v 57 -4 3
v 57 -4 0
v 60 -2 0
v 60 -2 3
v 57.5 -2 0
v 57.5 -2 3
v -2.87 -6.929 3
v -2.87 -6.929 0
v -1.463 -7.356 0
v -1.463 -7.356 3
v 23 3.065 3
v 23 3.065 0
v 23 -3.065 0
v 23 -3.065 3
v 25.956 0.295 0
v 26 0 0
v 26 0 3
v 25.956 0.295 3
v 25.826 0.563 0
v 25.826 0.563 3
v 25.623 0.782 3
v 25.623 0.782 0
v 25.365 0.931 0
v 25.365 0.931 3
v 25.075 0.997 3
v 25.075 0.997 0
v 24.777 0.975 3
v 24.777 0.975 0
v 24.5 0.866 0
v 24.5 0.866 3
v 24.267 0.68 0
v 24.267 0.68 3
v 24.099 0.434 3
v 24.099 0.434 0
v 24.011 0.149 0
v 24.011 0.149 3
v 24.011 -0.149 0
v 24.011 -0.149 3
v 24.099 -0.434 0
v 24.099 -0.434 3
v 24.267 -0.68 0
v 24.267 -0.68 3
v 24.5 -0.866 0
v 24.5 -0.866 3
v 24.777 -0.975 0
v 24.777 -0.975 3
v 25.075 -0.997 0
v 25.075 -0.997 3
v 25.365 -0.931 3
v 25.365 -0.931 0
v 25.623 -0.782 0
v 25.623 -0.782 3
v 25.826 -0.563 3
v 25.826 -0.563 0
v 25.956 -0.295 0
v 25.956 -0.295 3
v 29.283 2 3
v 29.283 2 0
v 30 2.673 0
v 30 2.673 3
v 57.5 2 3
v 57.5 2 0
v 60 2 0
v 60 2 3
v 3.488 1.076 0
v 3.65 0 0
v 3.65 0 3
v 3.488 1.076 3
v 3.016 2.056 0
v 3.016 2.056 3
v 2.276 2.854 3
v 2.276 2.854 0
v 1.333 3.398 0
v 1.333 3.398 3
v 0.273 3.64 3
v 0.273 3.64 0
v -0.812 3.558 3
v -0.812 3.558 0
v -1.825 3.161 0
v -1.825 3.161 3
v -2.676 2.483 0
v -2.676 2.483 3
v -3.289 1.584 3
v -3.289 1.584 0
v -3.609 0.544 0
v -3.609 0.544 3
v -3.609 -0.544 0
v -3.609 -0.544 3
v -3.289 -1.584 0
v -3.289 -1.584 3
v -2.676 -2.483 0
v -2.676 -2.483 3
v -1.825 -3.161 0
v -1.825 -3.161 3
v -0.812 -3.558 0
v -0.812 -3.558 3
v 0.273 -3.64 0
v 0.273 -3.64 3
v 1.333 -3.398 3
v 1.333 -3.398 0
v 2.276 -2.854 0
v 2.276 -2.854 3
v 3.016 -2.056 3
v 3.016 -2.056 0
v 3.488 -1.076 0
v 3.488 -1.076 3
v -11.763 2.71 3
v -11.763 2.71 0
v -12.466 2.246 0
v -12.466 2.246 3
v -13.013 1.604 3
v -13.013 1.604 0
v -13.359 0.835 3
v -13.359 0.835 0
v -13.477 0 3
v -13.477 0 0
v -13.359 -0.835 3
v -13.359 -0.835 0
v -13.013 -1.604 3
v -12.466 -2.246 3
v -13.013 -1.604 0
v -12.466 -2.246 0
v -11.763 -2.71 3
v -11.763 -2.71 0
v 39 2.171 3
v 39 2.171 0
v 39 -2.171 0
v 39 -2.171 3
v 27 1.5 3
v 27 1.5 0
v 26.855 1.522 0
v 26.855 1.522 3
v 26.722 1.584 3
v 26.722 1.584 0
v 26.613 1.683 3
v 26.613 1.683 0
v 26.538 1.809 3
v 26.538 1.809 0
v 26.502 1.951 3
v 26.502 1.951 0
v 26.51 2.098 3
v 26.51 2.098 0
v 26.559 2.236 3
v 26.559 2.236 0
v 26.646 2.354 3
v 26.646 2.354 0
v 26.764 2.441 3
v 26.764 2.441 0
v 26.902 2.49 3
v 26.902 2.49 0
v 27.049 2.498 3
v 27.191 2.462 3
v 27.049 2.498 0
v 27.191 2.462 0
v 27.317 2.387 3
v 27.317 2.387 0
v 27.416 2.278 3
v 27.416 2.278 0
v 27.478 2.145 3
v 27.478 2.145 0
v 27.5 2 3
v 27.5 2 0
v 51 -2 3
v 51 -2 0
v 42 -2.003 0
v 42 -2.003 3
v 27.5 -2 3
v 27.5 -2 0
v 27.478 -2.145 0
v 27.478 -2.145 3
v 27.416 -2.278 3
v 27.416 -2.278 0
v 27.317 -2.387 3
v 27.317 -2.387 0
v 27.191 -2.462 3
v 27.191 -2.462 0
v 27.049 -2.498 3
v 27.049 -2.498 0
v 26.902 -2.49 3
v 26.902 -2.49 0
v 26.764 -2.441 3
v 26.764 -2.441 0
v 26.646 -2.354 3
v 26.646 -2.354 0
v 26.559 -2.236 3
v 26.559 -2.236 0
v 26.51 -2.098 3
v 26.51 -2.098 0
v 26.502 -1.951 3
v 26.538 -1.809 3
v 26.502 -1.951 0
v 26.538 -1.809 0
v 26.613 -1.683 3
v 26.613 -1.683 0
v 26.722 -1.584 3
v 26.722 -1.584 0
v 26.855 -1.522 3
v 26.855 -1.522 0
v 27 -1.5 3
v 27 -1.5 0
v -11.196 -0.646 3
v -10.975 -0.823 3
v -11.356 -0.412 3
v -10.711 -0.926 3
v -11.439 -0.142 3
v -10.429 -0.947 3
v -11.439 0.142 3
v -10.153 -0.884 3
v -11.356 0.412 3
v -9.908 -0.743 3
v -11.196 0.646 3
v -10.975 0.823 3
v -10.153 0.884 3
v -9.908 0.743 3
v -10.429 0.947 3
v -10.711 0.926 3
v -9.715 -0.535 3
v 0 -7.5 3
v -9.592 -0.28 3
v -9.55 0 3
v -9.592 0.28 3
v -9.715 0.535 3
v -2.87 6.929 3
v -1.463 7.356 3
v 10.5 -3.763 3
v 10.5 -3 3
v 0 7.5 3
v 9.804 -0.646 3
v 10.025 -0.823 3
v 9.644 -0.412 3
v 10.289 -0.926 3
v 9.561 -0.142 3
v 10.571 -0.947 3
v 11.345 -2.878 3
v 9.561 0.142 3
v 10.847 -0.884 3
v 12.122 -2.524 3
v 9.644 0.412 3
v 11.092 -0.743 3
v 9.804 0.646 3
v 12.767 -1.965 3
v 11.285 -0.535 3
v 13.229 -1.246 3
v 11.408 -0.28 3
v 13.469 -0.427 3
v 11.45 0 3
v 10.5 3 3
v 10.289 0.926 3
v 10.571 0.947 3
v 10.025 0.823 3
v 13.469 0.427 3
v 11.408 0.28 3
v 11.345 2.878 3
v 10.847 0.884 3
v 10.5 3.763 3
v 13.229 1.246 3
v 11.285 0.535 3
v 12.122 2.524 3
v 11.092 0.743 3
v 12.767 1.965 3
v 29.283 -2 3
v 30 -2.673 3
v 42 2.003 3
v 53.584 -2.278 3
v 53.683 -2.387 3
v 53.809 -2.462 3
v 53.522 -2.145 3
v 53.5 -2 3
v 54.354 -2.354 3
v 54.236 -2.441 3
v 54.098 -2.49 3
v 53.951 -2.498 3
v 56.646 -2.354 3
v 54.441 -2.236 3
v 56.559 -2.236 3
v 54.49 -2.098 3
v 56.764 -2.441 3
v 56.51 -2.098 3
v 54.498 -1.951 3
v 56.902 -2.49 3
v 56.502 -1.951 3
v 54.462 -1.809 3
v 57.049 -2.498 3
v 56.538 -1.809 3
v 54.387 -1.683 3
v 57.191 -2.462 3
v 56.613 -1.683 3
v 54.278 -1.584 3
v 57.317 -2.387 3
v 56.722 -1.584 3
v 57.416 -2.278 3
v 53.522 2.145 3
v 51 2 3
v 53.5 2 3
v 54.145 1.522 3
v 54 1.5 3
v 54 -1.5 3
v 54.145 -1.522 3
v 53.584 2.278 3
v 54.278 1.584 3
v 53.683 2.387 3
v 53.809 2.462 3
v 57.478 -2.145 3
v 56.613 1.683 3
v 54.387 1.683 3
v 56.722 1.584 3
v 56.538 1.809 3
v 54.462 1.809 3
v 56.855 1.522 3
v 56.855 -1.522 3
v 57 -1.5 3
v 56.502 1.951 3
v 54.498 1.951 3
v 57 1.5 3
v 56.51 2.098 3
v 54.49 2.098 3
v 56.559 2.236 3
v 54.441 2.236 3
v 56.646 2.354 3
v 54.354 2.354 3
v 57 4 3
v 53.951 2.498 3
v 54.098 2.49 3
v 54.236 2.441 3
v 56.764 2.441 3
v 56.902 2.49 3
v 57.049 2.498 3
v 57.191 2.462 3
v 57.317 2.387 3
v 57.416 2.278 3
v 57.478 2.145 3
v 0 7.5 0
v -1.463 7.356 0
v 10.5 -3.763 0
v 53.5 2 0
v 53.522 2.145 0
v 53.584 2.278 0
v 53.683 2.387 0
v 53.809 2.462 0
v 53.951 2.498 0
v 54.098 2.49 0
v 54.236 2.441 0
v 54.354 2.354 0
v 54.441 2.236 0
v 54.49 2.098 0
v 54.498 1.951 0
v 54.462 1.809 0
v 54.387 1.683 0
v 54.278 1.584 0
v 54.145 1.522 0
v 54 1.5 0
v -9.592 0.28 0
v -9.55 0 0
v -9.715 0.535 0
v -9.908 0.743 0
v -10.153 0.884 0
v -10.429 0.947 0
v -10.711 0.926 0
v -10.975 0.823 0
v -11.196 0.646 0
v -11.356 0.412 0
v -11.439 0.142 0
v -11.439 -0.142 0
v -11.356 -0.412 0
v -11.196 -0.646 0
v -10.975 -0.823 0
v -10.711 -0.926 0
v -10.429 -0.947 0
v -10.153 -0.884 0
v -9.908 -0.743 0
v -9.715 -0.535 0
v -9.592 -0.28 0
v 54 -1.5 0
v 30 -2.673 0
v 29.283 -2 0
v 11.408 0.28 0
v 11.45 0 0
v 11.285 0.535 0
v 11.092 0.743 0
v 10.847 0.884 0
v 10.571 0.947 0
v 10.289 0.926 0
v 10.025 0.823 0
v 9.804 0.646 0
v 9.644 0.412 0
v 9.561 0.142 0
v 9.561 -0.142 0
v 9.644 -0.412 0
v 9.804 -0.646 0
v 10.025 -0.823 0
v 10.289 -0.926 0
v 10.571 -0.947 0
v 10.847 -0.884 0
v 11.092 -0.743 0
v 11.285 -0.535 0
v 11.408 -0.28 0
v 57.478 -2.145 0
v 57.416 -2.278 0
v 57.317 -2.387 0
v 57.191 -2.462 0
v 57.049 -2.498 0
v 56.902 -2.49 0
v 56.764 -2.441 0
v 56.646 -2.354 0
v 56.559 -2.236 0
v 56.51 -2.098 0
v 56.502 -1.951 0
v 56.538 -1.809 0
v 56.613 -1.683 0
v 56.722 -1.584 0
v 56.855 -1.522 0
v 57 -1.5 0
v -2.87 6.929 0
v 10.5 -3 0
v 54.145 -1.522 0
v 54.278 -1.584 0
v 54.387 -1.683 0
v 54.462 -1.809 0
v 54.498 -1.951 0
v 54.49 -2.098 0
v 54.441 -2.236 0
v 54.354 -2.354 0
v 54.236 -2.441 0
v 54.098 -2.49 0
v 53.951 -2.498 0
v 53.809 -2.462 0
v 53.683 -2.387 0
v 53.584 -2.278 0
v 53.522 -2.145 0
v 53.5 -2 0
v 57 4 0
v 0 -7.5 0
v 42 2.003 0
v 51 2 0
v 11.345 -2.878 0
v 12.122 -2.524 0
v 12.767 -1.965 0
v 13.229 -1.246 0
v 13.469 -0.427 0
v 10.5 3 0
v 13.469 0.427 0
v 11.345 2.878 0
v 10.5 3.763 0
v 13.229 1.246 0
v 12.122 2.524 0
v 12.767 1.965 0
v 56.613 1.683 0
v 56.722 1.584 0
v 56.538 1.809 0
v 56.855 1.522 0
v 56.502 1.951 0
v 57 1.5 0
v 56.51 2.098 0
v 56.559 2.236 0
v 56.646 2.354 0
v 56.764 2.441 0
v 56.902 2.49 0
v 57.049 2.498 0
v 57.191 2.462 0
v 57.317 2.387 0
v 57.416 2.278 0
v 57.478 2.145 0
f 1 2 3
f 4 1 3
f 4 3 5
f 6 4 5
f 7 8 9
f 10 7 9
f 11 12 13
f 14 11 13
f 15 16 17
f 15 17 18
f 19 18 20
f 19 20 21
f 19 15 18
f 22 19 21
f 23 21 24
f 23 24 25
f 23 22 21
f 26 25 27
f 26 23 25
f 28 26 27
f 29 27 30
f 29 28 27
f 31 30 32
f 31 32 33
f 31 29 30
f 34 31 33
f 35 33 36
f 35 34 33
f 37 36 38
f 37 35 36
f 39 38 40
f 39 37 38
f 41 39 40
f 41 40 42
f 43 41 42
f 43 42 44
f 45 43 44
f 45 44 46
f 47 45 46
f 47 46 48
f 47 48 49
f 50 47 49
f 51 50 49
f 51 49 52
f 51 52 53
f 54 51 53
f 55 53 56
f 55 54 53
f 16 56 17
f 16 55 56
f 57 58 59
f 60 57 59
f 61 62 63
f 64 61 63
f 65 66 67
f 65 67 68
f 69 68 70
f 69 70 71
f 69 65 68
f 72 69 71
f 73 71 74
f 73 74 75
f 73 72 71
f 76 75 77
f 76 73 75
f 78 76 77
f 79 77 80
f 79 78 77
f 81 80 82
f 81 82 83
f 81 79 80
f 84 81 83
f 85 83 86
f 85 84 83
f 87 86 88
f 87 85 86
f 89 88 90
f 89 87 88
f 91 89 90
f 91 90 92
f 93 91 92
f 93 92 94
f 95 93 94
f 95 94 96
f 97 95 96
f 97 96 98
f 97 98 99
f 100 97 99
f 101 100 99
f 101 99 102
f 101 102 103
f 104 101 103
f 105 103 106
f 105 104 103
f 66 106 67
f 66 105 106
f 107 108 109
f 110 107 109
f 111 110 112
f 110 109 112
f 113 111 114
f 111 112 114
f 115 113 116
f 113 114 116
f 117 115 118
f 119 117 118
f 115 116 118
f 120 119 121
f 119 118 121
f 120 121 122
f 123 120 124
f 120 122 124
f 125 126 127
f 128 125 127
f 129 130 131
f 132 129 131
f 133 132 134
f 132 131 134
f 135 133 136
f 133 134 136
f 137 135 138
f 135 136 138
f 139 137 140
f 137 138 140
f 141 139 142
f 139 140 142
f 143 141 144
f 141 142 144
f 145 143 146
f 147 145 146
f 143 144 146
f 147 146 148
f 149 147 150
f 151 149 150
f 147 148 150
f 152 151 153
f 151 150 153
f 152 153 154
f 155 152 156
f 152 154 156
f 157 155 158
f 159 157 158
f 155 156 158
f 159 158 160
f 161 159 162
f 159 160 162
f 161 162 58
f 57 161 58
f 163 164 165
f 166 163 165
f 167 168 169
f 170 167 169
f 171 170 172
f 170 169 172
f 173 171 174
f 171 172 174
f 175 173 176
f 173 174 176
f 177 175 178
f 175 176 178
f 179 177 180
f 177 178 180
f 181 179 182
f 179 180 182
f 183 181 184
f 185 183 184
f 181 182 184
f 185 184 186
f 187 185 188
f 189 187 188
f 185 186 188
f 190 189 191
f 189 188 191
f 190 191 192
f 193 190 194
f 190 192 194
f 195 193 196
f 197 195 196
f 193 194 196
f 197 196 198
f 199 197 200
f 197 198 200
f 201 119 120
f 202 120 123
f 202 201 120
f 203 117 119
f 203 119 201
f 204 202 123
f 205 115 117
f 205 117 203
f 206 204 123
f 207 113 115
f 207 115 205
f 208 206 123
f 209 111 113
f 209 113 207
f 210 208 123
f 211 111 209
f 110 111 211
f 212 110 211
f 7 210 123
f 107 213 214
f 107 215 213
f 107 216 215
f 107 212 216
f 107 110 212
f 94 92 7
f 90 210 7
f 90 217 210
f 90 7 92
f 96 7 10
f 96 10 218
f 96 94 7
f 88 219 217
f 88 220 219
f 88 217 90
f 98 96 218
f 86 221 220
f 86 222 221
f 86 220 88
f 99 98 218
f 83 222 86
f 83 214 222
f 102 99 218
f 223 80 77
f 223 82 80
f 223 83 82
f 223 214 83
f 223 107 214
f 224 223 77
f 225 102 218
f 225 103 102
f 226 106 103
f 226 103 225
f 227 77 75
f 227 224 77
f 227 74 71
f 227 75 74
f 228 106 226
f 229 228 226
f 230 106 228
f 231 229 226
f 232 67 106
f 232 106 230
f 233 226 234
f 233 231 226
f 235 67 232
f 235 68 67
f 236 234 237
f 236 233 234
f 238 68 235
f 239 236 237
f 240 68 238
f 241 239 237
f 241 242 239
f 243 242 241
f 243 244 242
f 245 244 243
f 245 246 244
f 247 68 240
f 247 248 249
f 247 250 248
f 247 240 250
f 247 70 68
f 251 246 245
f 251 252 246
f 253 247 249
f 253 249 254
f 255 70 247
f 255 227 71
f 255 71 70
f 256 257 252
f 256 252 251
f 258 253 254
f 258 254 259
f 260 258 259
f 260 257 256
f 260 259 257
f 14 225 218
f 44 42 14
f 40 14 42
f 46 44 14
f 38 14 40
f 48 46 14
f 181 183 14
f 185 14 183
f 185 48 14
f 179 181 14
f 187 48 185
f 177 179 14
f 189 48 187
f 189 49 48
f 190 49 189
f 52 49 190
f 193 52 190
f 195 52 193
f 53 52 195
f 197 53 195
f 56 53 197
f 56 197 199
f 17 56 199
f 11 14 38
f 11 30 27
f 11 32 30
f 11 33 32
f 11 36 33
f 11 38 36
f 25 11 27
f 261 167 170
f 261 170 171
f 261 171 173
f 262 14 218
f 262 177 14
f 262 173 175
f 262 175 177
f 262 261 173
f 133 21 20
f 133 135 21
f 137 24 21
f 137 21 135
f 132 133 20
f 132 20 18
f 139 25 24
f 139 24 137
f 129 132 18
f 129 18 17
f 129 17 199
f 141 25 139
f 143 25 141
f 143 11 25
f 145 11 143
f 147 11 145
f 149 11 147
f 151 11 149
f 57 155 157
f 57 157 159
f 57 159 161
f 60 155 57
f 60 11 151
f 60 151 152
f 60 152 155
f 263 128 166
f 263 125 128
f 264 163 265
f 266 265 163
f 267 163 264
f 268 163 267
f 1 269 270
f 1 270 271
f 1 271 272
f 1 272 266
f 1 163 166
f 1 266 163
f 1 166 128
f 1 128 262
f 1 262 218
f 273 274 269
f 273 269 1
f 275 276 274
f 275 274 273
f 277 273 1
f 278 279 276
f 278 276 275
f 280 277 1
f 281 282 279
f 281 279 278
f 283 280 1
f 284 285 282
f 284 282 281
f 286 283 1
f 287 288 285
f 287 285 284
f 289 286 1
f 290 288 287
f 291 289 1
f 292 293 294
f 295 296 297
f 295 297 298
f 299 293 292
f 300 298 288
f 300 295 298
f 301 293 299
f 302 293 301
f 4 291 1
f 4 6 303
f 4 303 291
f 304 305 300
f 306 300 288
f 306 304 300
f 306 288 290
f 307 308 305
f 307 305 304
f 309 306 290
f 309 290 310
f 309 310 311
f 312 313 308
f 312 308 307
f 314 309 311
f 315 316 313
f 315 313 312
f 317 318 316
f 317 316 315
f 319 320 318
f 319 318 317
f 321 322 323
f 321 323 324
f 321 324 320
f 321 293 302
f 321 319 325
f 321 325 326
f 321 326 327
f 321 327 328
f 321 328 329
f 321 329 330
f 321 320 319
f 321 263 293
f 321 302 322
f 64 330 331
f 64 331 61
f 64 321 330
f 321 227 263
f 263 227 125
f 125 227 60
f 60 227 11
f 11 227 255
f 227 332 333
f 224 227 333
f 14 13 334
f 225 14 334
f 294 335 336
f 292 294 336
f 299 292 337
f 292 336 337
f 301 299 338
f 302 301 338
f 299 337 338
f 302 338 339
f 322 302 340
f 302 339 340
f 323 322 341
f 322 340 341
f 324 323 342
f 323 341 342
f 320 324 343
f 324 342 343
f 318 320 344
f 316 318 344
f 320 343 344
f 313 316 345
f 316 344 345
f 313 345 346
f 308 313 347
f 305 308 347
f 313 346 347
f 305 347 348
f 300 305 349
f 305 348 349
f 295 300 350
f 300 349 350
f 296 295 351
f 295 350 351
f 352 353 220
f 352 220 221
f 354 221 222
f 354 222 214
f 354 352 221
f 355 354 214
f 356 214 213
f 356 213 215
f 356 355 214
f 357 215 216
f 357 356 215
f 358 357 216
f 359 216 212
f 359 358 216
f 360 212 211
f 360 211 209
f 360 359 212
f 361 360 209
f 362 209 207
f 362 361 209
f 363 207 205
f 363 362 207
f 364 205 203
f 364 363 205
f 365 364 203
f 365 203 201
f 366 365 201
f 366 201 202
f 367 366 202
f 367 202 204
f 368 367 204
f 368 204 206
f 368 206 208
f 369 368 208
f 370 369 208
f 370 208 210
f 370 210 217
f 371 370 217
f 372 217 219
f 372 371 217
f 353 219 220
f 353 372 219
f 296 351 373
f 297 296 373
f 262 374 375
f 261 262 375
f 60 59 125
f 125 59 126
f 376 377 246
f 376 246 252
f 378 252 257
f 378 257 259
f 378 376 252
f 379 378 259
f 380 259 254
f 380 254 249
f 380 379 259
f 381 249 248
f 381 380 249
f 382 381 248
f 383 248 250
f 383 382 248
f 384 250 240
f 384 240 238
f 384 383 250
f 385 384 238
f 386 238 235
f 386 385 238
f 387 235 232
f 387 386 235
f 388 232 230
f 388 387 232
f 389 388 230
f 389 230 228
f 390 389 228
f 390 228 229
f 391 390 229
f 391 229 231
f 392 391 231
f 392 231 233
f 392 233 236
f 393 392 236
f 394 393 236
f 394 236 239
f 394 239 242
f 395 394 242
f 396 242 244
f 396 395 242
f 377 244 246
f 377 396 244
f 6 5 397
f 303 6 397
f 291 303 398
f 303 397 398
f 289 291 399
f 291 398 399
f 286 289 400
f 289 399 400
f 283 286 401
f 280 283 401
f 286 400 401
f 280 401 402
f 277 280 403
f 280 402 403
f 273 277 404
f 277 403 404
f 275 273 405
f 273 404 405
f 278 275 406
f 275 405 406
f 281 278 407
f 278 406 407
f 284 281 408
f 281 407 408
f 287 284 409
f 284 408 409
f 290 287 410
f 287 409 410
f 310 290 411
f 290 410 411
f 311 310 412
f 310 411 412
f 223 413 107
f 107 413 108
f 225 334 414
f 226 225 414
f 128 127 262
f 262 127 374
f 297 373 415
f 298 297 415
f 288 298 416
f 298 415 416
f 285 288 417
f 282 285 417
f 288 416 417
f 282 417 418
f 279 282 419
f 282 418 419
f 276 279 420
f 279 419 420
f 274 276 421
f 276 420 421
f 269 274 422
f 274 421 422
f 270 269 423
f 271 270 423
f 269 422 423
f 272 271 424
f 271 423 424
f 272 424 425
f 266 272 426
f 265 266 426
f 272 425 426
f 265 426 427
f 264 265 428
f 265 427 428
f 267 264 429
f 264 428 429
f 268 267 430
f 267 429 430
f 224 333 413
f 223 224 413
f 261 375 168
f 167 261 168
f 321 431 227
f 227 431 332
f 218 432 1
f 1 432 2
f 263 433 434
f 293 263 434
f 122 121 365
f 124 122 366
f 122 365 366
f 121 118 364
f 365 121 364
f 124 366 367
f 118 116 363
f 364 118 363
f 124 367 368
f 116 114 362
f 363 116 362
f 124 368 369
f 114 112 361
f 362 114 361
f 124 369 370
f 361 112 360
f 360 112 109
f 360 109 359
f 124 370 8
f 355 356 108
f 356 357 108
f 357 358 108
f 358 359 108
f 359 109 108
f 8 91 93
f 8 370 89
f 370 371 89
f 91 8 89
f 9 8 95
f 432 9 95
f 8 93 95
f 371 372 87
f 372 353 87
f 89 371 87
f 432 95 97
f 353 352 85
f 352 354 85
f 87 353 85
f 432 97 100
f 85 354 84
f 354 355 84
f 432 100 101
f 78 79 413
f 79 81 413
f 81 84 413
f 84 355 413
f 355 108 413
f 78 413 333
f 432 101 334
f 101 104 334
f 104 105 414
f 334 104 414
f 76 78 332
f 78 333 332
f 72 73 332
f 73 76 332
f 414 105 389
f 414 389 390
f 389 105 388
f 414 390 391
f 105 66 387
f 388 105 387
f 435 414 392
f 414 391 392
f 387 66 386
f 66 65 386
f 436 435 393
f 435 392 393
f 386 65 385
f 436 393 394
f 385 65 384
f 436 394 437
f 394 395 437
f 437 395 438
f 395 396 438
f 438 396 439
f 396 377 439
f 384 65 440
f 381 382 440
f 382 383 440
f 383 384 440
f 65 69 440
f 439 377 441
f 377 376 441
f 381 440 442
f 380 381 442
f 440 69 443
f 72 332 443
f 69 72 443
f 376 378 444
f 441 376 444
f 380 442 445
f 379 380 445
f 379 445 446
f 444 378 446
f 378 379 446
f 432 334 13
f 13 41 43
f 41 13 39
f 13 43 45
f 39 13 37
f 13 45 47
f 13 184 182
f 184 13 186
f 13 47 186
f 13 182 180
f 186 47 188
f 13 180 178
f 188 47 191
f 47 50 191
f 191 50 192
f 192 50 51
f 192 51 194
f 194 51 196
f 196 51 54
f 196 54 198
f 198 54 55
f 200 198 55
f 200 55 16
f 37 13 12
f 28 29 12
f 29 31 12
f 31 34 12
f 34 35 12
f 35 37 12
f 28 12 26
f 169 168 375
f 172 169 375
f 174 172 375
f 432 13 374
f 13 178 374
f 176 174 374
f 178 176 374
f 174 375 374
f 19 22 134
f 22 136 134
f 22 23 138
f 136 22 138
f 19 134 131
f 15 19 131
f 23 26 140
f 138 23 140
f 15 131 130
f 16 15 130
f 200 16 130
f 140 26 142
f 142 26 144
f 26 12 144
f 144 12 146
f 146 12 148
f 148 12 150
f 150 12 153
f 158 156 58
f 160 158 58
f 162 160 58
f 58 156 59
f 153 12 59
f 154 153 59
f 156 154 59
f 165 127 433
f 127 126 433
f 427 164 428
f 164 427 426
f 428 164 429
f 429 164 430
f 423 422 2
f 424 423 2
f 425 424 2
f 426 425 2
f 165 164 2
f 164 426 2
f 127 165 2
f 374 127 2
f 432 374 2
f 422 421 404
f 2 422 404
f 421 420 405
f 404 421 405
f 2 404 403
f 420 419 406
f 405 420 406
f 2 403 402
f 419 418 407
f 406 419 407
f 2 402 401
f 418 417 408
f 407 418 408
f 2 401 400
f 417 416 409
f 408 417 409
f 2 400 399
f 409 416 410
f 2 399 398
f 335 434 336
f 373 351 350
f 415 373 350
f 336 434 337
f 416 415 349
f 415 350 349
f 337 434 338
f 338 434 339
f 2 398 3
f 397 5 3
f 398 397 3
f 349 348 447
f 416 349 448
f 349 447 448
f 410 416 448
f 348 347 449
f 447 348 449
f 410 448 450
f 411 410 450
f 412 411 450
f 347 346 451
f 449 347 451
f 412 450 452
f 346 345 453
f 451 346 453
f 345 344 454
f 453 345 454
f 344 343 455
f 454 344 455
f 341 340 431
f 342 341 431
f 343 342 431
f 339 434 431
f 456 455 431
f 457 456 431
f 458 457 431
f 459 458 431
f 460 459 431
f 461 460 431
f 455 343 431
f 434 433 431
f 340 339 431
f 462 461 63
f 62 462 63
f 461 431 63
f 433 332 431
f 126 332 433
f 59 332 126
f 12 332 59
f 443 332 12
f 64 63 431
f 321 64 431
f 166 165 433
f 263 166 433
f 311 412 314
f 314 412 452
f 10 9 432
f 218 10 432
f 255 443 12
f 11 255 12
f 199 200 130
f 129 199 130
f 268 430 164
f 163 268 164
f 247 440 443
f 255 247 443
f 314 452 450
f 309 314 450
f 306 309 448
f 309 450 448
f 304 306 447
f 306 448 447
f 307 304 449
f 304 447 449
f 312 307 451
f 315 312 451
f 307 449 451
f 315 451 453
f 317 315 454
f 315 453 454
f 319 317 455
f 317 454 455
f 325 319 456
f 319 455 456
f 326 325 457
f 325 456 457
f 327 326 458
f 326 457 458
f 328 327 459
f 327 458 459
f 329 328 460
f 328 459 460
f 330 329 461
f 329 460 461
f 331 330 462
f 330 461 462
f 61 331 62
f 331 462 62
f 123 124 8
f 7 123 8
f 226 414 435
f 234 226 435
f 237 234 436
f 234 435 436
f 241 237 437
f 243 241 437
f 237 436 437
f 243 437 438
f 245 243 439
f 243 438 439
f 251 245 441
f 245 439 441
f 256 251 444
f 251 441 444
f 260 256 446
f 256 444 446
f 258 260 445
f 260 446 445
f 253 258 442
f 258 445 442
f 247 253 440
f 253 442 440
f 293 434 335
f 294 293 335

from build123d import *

# Parameters (mm, degrees)
SKETCH_2_R      = 0.999999817
SKETCH_2_R_2    = 0.950000242
SKETCH_2_R_3    = 3.65
EXTRUDE_2_DEPTH = 3


with BuildPart() as part:
    # 草图2 → 凸台-拉伸2 (new body)
    with BuildSketch(Plane.XY):
        with BuildLine():
            Line((57.00000003, 4.00000019), (0, 7.499999832))
            Line((0, 7.499999832), (-1.463177381, 7.355889771))
            Line((-1.463177381, 7.355889771), (-2.870125696, 6.9290963))
            Line((-2.870125696, 6.9290963), (-11.76304094, 2.710484566))
            ThreePointArc((-11.76304094, 2.710484566), (-13.477244136, 0), (-11.76304094, -2.710484566))
            Line((-11.76304094, -2.710484566), (-2.870125696, -6.9290963))
            Line((-2.870125696, -6.9290963), (-1.463177381, -7.355889771))
            Line((-1.463177381, -7.355889771), (0, -7.499999832))
            Line((0, -7.499999832), (57.00000003, -4.00000019))
            Line((57.00000003, -4.00000019), (59.999998659, -2.000000095))
            Line((59.999998659, -2.000000095), (57.500001043, -2.000000095))
            ThreePointArc((57.500001043, -2.000000095), (56.646447675, -2.35355404), (57.00000003, -1.500000013))
            Line((57.00000003, -1.500000013), (57.00000003, 1.500000013))
            ThreePointArc((57.00000003, 1.500000013), (56.646447675, 2.35355404), (57.500001043, 2.000000095))
            Line((57.500001043, 2.000000095), (59.999998659, 2.000000095))
            Line((59.999998659, 2.000000095), (57.00000003, 4.00000019))
        make_face()
        with Locations((25.000000026, 3.041e-06)):
            Circle(SKETCH_2_R, mode=Mode.SUBTRACT)
        with Locations((10.499999852, -1.691e-06)):
            Circle(SKETCH_2_R_2, mode=Mode.SUBTRACT)
        with Locations((-10.499999865, -1.691e-06)):
            Circle(SKETCH_2_R_2, mode=Mode.SUBTRACT)
        Circle(SKETCH_2_R_3, mode=Mode.SUBTRACT)
        with BuildLine():
            Line((41.999999434, 2.002923982), (50.999999046, 2.000000095))
            Line((50.999999046, 2.000000095), (53.500000387, 2.000000095))
            ThreePointArc((53.500000387, 2.000000095), (54.353553756, 2.35355404), (54.000001401, 1.500000013))
            Line((54.000001401, 1.500000013), (54.000001401, -1.500000013))
            ThreePointArc((54.000001401, -1.500000013), (54.353553756, -2.35355404), (53.500000387, -2.000000095))
            Line((53.500000387, -2.000000095), (50.999999046, -2.000000095))
            Line((50.999999046, -2.000000095), (41.999999434, -2.002923982))
            Line((41.999999434, -2.002923982), (41.999999434, 2.002923982))
        make_face(mode=Mode.SUBTRACT)
        with BuildLine():
            Line((27.499999851, 2.000000095), (29.282599688, 2.000000095))
            Line((29.282599688, 2.000000095), (29.999999329, 2.673489275))
            Line((29.999999329, 2.673489275), (39.000000805, 2.170565305))
            Line((39.000000805, 2.170565305), (39.000000805, -2.170565305))
            Line((39.000000805, -2.170565305), (29.999999329, -2.673489275))
            Line((29.999999329, -2.673489275), (29.282599688, -2.000000095))
            Line((29.282599688, -2.000000095), (27.499999851, -2.000000095))
            ThreePointArc((27.499999851, -2.000000095), (26.646446496, -2.353552709), (27.0000007, -1.500000013))
            Line((27.0000007, -1.500000013), (27.0000007, 1.500000013))
            ThreePointArc((27.0000007, 1.500000013), (26.646446496, 2.353552709), (27.499999851, 2.000000095))
        make_face(mode=Mode.SUBTRACT)
        with BuildLine():
            Line((10.499999858, -3.763157874), (10.499999858, -3.000008481))
            ThreePointArc((10.499999858, -3.000008481), (13.500006642, -1.691e-06), (10.499999858, 3.000008481))
            Line((10.499999858, 3.000008481), (10.499999858, 3.763157874))
            Line((10.499999858, 3.763157874), (23.000000045, 3.064652439))
            Line((23.000000045, 3.064652439), (23.000000045, -3.064652439))
            Line((23.000000045, -3.064652439), (10.499999858, -3.763157874))
        make_face(mode=Mode.SUBTRACT)
    extrude(amount=EXTRUDE_2_DEPTH)


solid = part.part
